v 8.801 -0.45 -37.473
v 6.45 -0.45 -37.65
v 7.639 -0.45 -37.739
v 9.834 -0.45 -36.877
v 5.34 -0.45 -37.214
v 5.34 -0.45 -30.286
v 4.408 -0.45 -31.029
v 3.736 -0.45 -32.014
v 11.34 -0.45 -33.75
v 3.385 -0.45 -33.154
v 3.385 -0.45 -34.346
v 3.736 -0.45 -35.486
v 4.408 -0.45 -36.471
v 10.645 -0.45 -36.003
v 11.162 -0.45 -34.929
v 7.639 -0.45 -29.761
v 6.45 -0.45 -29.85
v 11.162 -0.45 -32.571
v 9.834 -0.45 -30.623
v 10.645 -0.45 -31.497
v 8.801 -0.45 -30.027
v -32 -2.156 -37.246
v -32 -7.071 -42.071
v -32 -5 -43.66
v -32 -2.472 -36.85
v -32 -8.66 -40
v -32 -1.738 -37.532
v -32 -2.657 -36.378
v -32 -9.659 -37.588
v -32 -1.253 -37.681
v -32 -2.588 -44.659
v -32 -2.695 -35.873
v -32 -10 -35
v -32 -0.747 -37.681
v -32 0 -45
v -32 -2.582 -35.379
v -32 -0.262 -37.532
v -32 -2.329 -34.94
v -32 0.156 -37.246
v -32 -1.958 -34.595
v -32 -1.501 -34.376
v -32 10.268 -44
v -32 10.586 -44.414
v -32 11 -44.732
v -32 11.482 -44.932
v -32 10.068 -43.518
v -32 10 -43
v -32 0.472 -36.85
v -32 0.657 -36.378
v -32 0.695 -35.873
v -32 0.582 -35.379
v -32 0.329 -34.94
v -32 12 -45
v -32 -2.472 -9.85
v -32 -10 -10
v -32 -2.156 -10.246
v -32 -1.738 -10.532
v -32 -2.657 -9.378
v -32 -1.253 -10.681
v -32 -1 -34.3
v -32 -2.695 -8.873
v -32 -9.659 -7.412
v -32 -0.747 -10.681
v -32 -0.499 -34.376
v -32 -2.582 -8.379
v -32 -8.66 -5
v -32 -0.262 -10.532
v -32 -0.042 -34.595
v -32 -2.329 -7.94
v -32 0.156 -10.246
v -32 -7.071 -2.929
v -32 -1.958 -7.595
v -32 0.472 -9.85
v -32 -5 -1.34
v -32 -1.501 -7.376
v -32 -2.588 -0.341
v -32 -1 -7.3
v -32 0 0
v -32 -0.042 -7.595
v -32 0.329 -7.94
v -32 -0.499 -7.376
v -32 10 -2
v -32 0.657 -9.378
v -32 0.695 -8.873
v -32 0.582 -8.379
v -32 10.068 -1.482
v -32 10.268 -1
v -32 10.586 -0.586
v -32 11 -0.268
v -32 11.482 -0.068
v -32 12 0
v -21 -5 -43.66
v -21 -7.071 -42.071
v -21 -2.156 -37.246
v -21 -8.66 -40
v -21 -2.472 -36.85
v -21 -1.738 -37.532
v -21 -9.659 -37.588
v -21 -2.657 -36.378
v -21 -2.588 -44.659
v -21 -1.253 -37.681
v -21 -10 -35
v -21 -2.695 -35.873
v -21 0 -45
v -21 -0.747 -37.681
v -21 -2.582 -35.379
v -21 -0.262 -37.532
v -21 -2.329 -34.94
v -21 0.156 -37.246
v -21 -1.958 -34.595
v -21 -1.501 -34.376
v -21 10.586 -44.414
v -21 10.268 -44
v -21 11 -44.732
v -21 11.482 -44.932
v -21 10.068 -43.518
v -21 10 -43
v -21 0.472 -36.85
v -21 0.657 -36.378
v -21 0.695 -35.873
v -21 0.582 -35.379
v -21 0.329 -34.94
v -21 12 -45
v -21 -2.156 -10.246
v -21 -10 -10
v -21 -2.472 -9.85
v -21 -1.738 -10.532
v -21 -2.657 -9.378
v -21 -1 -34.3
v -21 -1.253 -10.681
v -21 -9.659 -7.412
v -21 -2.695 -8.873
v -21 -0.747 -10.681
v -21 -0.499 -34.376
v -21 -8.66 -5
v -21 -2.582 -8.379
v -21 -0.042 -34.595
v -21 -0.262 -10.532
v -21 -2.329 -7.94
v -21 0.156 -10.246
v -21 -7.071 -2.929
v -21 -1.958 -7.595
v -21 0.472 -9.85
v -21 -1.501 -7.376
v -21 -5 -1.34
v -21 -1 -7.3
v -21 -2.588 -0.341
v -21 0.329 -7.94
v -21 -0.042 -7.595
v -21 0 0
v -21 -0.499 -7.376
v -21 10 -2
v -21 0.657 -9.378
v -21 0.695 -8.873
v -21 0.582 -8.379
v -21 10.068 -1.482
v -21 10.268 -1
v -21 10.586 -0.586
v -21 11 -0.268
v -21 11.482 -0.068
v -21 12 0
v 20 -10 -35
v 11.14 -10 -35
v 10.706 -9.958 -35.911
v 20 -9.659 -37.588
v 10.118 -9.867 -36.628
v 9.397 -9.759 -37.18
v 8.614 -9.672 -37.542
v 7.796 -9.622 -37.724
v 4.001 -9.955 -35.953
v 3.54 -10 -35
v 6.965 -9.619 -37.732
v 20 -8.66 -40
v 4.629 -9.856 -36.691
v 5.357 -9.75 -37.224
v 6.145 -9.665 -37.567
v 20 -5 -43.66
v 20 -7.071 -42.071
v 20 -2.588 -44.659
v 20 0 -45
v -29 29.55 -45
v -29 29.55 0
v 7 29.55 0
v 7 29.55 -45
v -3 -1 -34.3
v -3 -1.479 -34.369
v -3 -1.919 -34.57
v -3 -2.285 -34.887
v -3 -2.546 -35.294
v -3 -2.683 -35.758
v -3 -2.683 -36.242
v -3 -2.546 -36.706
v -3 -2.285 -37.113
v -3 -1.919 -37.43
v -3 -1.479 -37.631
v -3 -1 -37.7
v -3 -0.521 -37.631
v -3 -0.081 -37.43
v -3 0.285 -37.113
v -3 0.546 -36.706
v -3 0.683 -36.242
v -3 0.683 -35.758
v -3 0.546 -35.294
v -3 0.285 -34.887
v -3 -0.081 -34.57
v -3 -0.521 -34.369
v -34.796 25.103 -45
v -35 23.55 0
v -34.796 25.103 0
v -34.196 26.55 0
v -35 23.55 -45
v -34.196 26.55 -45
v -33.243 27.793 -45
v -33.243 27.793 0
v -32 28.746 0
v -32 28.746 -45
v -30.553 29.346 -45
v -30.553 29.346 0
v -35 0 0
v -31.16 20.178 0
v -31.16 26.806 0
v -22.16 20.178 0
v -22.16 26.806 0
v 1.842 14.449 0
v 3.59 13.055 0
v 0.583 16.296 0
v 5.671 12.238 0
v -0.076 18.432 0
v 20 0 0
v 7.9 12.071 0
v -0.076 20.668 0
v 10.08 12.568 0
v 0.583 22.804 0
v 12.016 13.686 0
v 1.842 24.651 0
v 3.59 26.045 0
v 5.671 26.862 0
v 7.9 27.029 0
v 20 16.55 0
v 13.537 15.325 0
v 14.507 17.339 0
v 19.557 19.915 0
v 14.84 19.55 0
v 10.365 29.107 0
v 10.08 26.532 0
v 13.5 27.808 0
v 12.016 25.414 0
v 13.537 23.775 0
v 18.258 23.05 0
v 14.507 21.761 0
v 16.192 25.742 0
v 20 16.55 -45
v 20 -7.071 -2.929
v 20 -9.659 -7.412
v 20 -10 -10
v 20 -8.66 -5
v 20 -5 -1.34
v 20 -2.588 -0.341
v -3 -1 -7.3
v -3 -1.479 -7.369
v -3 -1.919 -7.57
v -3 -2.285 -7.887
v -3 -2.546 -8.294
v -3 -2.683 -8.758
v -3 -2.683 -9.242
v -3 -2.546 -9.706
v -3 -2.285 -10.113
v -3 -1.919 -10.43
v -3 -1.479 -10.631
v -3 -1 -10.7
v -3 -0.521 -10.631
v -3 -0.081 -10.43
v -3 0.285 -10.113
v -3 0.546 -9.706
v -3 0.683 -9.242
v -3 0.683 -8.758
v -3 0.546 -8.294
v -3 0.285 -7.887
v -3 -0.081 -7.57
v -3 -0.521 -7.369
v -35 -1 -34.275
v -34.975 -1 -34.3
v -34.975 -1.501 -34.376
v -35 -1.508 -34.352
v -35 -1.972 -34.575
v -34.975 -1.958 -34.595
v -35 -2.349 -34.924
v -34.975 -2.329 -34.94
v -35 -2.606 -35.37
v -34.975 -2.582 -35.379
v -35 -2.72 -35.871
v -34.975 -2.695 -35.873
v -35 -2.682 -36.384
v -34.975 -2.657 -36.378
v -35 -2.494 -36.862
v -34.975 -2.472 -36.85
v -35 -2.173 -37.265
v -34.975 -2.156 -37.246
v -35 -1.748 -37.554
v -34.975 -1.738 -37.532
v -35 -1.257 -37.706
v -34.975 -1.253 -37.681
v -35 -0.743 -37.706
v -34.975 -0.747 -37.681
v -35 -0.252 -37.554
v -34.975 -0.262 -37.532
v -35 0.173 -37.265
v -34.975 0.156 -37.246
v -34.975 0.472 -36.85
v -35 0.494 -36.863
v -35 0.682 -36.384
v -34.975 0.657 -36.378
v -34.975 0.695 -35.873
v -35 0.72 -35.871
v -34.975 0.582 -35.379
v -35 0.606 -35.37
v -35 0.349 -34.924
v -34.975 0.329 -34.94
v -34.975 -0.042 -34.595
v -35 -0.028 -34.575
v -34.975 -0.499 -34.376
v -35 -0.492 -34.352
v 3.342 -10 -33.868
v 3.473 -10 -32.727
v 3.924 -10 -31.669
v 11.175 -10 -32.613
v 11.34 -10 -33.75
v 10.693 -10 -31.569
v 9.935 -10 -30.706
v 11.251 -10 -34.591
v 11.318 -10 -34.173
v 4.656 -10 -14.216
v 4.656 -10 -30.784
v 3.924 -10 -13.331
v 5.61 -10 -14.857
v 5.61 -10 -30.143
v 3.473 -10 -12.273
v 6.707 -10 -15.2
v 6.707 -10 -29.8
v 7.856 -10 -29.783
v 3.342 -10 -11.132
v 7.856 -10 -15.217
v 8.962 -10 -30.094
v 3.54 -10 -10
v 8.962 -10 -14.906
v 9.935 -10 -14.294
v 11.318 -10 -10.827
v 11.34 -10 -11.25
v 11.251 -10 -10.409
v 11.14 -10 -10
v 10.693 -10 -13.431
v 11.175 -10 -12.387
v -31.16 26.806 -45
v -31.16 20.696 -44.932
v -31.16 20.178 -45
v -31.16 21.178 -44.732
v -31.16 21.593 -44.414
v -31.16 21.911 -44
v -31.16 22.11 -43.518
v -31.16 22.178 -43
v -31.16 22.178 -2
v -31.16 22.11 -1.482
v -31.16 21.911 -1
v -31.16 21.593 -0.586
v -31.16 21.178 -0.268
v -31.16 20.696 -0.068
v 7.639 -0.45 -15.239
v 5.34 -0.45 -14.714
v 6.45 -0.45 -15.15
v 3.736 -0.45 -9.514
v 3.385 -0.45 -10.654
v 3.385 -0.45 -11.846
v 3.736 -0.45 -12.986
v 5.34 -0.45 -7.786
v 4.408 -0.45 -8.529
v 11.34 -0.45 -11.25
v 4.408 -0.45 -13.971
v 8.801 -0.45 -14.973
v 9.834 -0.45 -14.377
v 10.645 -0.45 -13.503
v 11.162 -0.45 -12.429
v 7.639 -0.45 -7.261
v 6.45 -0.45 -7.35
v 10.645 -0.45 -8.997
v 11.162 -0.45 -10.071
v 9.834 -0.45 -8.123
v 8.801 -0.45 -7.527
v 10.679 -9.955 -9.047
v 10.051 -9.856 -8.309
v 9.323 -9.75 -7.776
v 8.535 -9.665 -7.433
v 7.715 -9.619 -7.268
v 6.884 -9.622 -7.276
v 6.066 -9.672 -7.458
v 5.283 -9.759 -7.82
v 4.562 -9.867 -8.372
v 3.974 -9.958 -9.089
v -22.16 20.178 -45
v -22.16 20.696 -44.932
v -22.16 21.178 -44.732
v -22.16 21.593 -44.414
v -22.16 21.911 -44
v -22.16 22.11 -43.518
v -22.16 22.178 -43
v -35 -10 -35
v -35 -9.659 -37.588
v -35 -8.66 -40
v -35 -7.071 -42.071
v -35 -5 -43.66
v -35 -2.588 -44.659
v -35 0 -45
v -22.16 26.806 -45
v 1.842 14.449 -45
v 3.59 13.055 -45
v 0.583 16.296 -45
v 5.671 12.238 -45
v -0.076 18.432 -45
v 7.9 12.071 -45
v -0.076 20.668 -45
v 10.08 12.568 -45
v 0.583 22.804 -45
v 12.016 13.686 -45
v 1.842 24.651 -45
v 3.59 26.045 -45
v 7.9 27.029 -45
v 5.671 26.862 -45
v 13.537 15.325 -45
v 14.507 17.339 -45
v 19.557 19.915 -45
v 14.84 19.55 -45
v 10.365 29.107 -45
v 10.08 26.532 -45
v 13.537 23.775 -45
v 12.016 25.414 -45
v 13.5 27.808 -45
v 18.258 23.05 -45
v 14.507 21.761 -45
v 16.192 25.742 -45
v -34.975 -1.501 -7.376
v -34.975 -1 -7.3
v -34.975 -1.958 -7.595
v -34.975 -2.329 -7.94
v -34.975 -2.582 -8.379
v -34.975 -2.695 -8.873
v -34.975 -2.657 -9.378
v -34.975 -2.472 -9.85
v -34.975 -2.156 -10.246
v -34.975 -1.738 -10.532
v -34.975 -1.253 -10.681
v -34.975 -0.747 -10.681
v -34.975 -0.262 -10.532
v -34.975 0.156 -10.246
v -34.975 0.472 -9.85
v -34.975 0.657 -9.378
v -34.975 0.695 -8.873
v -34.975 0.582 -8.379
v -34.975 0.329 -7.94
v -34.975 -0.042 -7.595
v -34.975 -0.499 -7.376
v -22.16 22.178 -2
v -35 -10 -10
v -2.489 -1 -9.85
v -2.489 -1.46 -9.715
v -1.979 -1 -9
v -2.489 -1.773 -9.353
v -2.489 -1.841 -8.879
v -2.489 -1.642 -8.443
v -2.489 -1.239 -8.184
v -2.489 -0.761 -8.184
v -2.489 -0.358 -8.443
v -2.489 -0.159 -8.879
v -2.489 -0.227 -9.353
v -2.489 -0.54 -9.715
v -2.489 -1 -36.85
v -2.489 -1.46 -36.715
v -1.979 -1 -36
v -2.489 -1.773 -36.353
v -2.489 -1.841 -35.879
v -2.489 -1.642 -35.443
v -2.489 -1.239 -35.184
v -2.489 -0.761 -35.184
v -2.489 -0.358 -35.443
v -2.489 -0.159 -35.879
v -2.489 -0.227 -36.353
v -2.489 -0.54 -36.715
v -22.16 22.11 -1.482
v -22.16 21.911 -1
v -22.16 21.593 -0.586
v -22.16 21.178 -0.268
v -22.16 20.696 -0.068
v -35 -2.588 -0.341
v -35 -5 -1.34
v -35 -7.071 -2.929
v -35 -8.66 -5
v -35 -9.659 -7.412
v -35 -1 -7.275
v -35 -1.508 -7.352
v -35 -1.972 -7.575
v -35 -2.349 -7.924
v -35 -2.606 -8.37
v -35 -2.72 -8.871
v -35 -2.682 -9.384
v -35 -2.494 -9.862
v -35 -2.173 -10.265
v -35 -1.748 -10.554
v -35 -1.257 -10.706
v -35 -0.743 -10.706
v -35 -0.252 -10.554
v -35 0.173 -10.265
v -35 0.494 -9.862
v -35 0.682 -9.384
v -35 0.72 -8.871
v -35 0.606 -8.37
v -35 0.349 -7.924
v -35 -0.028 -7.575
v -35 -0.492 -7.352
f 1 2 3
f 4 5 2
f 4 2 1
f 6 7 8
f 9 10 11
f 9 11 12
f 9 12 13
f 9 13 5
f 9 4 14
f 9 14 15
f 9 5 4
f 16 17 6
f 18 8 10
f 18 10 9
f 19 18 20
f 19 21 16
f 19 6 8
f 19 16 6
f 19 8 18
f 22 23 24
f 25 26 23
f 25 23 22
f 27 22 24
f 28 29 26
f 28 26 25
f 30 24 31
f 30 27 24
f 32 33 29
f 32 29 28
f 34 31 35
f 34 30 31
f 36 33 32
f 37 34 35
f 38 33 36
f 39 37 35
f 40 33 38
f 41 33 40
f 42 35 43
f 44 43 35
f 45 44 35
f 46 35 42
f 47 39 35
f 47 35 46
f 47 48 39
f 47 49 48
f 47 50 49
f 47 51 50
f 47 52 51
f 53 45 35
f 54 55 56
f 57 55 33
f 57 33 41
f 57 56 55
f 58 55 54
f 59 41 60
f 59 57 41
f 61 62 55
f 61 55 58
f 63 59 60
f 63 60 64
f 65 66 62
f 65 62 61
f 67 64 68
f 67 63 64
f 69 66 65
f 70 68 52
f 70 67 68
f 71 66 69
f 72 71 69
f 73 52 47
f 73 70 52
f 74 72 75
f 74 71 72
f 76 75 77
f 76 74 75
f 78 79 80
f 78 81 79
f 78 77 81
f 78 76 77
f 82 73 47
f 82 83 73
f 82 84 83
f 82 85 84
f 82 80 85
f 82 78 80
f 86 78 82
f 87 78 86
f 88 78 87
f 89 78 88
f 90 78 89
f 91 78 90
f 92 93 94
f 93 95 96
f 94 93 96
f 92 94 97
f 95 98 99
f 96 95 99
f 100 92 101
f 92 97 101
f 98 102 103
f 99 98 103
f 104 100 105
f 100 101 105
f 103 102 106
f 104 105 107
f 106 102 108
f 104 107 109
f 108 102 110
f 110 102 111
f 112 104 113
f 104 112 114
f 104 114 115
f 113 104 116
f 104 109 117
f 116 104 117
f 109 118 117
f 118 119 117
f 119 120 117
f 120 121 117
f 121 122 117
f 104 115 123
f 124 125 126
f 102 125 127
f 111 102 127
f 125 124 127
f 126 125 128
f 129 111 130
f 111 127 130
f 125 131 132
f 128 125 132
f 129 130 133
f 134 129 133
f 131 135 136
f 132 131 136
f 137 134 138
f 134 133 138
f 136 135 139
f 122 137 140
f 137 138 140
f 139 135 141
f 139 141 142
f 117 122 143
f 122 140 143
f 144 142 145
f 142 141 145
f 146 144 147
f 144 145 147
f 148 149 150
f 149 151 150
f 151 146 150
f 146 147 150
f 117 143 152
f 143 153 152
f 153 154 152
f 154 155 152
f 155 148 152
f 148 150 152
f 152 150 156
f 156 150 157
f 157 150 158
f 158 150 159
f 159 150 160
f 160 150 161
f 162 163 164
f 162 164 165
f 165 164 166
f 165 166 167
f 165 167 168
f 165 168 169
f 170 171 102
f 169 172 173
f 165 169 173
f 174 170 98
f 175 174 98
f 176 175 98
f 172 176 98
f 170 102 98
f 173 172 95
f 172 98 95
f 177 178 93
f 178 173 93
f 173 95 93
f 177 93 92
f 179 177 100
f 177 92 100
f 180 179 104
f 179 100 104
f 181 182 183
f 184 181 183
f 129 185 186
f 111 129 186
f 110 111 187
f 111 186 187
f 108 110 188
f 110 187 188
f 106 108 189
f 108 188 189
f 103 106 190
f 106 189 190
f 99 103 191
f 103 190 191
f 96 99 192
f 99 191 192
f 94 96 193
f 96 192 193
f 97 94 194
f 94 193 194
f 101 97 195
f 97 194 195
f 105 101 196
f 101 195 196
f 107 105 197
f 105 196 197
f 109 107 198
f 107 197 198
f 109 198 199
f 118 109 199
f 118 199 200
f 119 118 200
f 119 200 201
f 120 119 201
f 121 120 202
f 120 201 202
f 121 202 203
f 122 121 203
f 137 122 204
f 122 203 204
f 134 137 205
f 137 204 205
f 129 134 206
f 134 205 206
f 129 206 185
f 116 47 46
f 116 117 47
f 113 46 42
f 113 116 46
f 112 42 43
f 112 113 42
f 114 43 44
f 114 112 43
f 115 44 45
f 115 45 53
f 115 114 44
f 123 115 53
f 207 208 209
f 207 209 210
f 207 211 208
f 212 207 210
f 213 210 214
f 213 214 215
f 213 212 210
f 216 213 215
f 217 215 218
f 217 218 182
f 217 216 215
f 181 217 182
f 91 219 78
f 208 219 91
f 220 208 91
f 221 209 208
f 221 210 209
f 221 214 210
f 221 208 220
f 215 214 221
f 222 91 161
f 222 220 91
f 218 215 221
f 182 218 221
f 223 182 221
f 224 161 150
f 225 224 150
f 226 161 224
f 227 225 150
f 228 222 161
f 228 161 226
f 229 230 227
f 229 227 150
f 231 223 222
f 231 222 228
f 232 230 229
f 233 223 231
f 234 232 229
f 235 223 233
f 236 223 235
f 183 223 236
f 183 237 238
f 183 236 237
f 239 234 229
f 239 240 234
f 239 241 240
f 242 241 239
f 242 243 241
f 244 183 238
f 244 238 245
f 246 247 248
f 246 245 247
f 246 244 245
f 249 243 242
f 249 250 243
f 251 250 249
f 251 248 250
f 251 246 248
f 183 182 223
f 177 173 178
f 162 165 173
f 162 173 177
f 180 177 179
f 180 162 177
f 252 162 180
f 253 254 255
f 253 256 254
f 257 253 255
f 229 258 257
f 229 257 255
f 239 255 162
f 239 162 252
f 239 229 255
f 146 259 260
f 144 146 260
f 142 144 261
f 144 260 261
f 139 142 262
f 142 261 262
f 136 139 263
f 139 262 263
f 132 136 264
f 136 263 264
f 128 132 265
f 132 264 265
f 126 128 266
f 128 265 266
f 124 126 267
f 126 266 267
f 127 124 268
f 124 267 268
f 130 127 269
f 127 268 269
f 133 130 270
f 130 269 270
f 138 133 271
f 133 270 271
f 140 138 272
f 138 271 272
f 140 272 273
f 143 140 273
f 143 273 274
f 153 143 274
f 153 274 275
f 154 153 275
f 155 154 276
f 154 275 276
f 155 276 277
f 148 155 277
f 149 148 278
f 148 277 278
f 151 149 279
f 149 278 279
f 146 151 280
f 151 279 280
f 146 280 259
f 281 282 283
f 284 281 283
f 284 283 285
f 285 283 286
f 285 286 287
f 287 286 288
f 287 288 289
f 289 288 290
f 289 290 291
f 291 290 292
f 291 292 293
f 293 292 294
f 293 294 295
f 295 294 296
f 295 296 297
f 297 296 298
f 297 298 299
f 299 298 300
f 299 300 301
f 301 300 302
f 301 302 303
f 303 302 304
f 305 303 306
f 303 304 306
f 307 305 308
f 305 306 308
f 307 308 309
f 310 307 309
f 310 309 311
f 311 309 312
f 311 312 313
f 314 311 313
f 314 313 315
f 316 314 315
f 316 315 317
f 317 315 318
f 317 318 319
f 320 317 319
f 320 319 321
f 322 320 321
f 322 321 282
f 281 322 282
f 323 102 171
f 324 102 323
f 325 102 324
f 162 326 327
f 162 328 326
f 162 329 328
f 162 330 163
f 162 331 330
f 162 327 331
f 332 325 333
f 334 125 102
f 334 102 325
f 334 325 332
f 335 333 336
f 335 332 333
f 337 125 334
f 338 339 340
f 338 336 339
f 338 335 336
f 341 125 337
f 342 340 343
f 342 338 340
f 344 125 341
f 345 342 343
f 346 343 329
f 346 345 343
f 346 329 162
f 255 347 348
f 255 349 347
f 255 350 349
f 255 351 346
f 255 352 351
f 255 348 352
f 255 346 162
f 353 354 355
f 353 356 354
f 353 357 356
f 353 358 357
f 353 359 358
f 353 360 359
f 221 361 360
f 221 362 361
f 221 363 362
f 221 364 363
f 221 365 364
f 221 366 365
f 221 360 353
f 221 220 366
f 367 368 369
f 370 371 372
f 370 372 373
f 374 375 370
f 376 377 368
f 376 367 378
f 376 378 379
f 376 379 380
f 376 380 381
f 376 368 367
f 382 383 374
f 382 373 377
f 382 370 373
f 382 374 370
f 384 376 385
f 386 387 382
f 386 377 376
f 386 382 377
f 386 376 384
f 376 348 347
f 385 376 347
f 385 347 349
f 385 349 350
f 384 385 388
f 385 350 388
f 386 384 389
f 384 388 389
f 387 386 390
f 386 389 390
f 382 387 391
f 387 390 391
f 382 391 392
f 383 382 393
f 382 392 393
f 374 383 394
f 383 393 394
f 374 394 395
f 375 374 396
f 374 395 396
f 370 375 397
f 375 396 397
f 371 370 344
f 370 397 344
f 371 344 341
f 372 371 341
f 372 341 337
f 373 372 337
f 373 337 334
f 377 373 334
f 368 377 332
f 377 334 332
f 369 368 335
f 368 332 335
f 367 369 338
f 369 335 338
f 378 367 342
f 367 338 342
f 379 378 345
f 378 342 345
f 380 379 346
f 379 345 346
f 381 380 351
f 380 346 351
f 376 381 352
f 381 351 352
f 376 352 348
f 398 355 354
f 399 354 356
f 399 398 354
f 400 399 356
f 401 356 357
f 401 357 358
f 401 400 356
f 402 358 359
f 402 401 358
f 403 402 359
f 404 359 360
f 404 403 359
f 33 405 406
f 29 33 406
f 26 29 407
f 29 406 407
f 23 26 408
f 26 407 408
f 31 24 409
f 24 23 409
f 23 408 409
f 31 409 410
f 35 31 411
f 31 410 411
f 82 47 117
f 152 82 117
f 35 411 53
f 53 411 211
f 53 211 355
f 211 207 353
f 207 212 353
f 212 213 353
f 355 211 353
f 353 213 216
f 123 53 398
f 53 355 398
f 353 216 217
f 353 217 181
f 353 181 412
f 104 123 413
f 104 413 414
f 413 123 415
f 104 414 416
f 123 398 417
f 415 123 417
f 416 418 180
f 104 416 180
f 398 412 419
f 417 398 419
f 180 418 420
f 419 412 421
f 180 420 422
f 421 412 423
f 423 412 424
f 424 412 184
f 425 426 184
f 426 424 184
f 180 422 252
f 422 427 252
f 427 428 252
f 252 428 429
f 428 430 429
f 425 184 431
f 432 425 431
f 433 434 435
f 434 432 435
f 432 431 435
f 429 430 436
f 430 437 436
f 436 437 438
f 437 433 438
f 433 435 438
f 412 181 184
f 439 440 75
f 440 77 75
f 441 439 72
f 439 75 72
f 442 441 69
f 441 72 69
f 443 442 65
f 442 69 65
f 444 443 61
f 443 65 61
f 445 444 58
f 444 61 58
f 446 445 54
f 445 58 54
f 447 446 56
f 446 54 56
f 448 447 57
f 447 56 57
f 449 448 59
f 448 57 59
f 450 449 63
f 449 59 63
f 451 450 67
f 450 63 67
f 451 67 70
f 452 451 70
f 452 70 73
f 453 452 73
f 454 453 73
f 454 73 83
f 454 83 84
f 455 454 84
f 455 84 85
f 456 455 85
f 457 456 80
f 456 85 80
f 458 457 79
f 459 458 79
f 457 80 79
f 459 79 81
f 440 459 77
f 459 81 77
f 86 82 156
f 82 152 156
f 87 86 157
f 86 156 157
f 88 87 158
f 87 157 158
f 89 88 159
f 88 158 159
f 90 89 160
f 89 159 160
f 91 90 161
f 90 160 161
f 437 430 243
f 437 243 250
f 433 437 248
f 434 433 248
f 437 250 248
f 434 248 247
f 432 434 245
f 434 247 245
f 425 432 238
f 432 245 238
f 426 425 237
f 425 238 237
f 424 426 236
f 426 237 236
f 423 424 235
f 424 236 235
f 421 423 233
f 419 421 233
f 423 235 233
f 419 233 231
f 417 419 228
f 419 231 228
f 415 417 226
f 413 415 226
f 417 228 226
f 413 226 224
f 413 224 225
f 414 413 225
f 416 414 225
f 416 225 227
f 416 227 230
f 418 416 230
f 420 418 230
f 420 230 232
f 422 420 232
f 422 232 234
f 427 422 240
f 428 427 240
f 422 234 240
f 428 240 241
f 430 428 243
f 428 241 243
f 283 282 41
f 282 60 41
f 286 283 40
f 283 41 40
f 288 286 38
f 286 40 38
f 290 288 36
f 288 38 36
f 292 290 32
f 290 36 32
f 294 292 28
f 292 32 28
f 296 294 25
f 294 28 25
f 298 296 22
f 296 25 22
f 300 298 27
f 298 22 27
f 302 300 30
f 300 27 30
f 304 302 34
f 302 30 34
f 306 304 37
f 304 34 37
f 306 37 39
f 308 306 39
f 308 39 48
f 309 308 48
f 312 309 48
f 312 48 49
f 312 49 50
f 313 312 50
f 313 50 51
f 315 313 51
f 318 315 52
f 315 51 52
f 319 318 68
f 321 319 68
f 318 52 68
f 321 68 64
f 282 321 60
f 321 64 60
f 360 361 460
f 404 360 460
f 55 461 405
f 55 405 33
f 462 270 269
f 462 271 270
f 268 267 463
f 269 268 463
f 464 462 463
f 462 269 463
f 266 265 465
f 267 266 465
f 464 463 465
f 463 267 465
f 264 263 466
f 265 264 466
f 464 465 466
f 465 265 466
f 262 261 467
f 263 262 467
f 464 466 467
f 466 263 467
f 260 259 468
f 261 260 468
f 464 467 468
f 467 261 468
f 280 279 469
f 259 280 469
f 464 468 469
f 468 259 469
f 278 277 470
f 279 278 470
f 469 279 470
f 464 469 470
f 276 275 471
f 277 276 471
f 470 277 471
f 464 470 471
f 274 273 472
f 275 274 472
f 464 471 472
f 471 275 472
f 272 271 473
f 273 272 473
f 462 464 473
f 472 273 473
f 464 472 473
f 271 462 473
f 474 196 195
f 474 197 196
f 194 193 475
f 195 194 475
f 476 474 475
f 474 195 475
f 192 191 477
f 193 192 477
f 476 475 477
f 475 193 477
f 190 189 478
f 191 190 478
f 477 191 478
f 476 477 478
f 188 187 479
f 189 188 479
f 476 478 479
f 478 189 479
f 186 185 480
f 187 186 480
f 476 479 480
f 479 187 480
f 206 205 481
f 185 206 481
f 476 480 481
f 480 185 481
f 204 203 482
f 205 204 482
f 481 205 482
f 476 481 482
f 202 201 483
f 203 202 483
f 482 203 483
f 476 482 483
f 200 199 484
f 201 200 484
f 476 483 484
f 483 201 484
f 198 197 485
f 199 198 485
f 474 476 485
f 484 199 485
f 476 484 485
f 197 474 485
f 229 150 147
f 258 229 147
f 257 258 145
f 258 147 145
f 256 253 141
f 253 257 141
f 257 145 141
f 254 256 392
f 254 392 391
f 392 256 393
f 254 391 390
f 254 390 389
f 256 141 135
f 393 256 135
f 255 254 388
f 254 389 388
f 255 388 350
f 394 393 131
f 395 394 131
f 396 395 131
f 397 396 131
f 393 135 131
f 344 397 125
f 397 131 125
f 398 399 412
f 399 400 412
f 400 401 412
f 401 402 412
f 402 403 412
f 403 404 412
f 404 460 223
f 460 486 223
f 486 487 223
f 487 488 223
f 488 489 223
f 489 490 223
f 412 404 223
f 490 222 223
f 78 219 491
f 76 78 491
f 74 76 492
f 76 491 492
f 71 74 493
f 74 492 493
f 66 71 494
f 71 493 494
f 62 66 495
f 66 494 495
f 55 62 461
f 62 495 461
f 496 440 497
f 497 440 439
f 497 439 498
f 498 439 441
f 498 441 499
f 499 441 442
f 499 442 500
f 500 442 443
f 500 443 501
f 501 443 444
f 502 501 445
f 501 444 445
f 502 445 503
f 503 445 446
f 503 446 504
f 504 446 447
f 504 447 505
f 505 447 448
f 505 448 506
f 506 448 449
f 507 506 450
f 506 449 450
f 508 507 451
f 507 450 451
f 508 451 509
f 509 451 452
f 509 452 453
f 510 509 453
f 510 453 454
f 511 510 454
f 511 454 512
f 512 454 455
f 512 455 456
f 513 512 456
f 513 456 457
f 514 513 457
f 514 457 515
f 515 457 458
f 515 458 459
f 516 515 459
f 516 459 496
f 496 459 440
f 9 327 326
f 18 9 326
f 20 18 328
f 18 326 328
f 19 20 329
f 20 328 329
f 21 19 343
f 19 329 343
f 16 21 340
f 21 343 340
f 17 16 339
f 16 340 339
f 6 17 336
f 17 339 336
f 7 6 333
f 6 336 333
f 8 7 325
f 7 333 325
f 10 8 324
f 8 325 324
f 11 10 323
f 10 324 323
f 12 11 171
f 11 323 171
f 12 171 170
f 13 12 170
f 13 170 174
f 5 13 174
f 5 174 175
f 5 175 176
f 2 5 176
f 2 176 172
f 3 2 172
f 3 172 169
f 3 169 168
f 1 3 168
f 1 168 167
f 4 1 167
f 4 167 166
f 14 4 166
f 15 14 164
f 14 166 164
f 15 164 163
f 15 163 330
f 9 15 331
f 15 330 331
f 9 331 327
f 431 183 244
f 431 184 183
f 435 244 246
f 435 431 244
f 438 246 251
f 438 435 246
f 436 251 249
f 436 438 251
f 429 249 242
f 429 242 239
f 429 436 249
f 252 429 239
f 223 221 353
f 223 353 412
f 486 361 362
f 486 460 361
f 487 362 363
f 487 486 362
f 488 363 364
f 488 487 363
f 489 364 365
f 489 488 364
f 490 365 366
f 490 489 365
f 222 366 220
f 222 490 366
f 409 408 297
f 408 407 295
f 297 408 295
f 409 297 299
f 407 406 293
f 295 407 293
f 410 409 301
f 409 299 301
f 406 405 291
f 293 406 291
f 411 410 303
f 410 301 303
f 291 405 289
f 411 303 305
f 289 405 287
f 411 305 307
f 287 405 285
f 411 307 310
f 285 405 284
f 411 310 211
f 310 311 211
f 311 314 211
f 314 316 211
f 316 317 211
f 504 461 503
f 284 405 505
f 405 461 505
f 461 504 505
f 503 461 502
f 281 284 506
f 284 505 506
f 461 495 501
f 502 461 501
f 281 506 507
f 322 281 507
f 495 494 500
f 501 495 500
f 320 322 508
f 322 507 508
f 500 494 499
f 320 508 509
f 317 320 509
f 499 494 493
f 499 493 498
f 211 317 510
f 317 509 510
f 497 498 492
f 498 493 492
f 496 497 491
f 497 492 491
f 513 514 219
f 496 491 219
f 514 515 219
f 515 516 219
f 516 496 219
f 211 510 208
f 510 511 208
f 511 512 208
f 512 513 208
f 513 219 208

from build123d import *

# Parameters (mm, degrees)
SKETCH1_W                      = 55
SKETCH1_H                      = 39.55
SKETCH1_R                      = 7.5
BOSS_EXTRUDE1_DEPTH            = 45
SKETCH3_R                      = 4
CUT_EXTRUDE1_DEPTH             = 9.55
SKETCH4_W                      = 11
SKETCH4_H                      = 20
CUT_EXTRUDE2_DEPTH             = 65.21216785
M3_CLEARANCE_HOLE1_D           = 3.4
M3_CLEARANCE_HOLE1_DEPTH       = 32
M3_CLEARANCE_HOLE1_CSINK_D     = 3.45
M3_CLEARANCE_HOLE1_CSINK_ANGLE = 90
M3_CLEARANCE_HOLE1_TIP         = 1.021463052
SKETCH8_W                      = 9
SKETCH8_H                      = 4.627198444
CUT_EXTRUDE3_DEPTH             = 65.21216785
FILLET1_R                      = 10
FILLET2_R                      = 2
FILLET3_R                      = 6
FILLET4_R                      = 13


with BuildPart() as part:
    # Sketch1 → Boss-Extrude1 (new body)
    with BuildSketch(Plane.XY):
        with Locations((-7.5, 9.775)):
            Rectangle(SKETCH1_W, SKETCH1_H)
        with Locations((7.34, 19.55)):
            Circle(SKETCH1_R, mode=Mode.SUBTRACT)
    extrude(amount=-BOSS_EXTRUDE1_DEPTH)

    # Sketch3 → Cut-Extrude1 (cut)
    with BuildSketch(Plane.XZ.offset(10)):
        with Locations((7.34, -11.25)):
            Circle(SKETCH3_R)
        with Locations((7.34, -33.75)):
            Circle(SKETCH3_R)
    extrude(amount=-CUT_EXTRUDE1_DEPTH, mode=Mode.SUBTRACT)

    # Sketch4 → Cut-Extrude2 (cut, through all)
    with BuildSketch(Plane.XY):
        with Locations((-26.5, 0)):
            Rectangle(SKETCH4_W, SKETCH4_H)
    extrude(amount=-CUT_EXTRUDE2_DEPTH, mode=Mode.SUBTRACT)

    # M3 Clearance Hole1
    with Locations(Plane(origin=(-35, -1, -36), x_dir=(0, 0, -1), z_dir=(-1, 0, 0))):
        with Locations((0, 0), (-27, 0)):
            CounterSinkHole(M3_CLEARANCE_HOLE1_D / 2, M3_CLEARANCE_HOLE1_CSINK_D / 2, depth=M3_CLEARANCE_HOLE1_DEPTH, counter_sink_angle=M3_CLEARANCE_HOLE1_CSINK_ANGLE)
            with Locations((0, 0, -(M3_CLEARANCE_HOLE1_DEPTH + M3_CLEARANCE_HOLE1_TIP / 2))):  # 118° drill point
                Cone(0, M3_CLEARANCE_HOLE1_D / 2, M3_CLEARANCE_HOLE1_TIP, mode=Mode.SUBTRACT)

    # Sketch8 → Cut-Extrude3 (cut, through all)
    with BuildSketch(Plane.XY):
        with Locations((-26.66, 24.492052806)):
            Rectangle(SKETCH8_W, SKETCH8_H)
    extrude(amount=-CUT_EXTRUDE3_DEPTH, mode=Mode.SUBTRACT)

    # Fillet1
    # the kernel refuses this fillet: 10 mm, written as the material it takes off along each edge
    with BuildSketch(Plane(origin=(-46, -10, 0), x_dir=(0, 1, 0), z_dir=(1, 0, 0))) as fillet1_piece_1:
        with BuildLine():
            CenterArc((FILLET1_R, -FILLET1_R), FILLET1_R, 90, 90)
            Line((0, -FILLET1_R), (0, 0))
            Line((0, 0), (FILLET1_R, 0))
        make_face()
    extrude(amount=91, mode=Mode.SUBTRACT)
    with BuildSketch(Plane(origin=(-46, -10, -45), x_dir=(0, 1, 0), z_dir=(1, 0, 0))) as fillet1_piece_2:
        with BuildLine():
            CenterArc((FILLET1_R, FILLET1_R), FILLET1_R, 180, 90)
            Line((0, FILLET1_R), (0, 0))
            Line((0, 0), (FILLET1_R, 0))
        make_face()
    extrude(amount=91, mode=Mode.SUBTRACT)
    with BuildSketch(Plane(origin=(-60, -10, 0), x_dir=(0, 1, 0), z_dir=(1, 0, 0))) as fillet1_piece_3:
        with BuildLine():
            CenterArc((FILLET1_R, -FILLET1_R), FILLET1_R, 90, 90)
            Line((0, -FILLET1_R), (0, 0))
            Line((0, 0), (FILLET1_R, 0))
        make_face()
    extrude(amount=53, mode=Mode.SUBTRACT)
    with BuildSketch(Plane(origin=(-60, -10, -45), x_dir=(0, 1, 0), z_dir=(1, 0, 0))) as fillet1_piece_4:
        with BuildLine():
            CenterArc((FILLET1_R, FILLET1_R), FILLET1_R, 180, 90)
            Line((0, FILLET1_R), (0, 0))
            Line((0, 0), (FILLET1_R, 0))
        make_face()
    extrude(amount=53, mode=Mode.SUBTRACT)

    # Fillet2
    fillet2_edges = [part.edges().sort_by_distance(p)[0] for p in [
        (-26.5, 10, -45),
        (-26.5, 10, 0),
        (-26.66, 22.178453584, -45),
        (-26.66, 22.178453584, 0),
    ]]
    fillet(fillet2_edges, radius=FILLET2_R)

    # Fillet3
    fillet3_edges = [part.edges().sort_by_distance(p)[0] for p in [
        (-35, 29.55, -22.5),
    ]]
    fillet(fillet3_edges, radius=FILLET3_R)

    # Fillet4
    fillet4_edges = [part.edges().sort_by_distance(p)[0] for p in [
        (20, 29.55, -22.5),
    ]]
    fillet(fillet4_edges, radius=FILLET4_R)


solid = part.part
